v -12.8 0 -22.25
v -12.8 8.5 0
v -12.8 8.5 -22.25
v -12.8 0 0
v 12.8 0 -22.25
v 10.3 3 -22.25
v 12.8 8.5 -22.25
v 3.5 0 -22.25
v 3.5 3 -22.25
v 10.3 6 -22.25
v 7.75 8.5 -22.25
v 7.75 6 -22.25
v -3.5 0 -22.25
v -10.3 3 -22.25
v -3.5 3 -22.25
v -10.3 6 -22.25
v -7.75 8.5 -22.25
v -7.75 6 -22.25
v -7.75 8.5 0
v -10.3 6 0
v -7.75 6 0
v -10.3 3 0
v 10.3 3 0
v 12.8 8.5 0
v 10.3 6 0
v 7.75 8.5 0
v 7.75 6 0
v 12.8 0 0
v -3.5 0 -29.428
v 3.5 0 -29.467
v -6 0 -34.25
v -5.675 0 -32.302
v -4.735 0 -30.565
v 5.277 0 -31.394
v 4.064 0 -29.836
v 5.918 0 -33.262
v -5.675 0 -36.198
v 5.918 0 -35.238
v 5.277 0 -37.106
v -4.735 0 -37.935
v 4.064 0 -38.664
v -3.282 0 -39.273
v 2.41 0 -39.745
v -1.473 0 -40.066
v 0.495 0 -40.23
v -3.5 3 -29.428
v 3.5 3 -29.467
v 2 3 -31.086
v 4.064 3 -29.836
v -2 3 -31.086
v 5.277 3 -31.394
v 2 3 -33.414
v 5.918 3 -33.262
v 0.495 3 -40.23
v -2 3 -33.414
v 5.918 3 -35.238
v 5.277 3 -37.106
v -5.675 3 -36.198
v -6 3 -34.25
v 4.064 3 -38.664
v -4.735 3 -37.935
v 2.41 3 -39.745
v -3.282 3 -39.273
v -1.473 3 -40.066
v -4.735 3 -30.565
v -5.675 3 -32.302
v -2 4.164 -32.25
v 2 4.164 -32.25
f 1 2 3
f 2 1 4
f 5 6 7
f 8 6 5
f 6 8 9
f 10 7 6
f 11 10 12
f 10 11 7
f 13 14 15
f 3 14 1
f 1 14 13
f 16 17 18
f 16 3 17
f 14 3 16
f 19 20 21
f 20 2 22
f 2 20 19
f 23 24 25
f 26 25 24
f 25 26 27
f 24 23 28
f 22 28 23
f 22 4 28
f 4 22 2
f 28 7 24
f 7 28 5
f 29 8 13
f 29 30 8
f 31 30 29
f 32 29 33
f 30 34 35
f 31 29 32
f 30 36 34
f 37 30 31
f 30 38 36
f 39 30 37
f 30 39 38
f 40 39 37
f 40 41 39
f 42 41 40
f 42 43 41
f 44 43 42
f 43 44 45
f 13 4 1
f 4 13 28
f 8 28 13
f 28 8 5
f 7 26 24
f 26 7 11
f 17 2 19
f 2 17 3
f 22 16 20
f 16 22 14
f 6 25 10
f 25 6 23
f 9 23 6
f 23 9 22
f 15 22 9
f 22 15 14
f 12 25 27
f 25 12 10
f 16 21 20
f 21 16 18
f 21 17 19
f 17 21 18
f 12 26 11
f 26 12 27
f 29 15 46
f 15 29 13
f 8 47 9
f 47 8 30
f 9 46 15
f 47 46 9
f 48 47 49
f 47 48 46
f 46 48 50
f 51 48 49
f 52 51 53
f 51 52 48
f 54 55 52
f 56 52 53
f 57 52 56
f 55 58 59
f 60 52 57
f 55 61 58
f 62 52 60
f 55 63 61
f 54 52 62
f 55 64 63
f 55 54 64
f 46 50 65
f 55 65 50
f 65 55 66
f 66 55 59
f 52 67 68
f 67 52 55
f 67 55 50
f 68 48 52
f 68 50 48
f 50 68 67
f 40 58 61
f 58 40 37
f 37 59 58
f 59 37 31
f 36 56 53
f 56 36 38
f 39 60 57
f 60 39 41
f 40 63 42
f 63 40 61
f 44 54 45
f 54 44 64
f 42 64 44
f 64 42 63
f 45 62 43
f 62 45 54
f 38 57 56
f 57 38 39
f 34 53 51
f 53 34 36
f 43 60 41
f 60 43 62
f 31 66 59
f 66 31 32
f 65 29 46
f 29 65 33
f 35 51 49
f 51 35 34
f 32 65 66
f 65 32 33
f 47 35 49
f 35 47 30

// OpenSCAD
/*

Adapter for bike light to rack
Gian Pablo Villamil
May 30, 2011

*/

bracket_height = 22.25;
tongue_width = 20.6;
tongue_thickness = 3;
base_width = 15.5;
base_thickness = 2.5;
side_thickness = 2.5;

plate_thickness = 3;
plate_width = 100;
plate_height = 20.3;

hole_dia = 5.8 ;
hole_sep = 82 ;


module bracket() {
	difference(){
		translate([-(tongue_width+(side_thickness *2))/2,0,0])
		cube(size = [tongue_width+(side_thickness * 2),plate_thickness+tongue_thickness+base_thickness, bracket_height], center = false);
		translate([-tongue_width/2,2.5,0])
		cube(size = [tongue_width, tongue_thickness, bracket_height], center=false);
		translate([-base_width/2,0,0])
		cube(size = [base_width, base_thickness, bracket_height], center=false);
	};
};

module release() {
	union() {
		translate([-3.5,-plate_thickness/2,0])
		#cube(size = [7, plate_thickness, 10], center = false);
		translate([0,-1.25,10]) rotate(a = 45, v = [1,0,0])
		cube(size = [4,2,2], center = true);
		translate([0,plate_thickness/2,12]) rotate(a = 90, v = [1,0,0])
		cylinder(h = plate_thickness, r = 6);
	};
}


rotate([0,0,180])
translate([0,-1.5,0])
mirror([0,0,1]){
translate([0,-7,0])
bracket();
translate([0,0,bracket_height+0])
release();
}
